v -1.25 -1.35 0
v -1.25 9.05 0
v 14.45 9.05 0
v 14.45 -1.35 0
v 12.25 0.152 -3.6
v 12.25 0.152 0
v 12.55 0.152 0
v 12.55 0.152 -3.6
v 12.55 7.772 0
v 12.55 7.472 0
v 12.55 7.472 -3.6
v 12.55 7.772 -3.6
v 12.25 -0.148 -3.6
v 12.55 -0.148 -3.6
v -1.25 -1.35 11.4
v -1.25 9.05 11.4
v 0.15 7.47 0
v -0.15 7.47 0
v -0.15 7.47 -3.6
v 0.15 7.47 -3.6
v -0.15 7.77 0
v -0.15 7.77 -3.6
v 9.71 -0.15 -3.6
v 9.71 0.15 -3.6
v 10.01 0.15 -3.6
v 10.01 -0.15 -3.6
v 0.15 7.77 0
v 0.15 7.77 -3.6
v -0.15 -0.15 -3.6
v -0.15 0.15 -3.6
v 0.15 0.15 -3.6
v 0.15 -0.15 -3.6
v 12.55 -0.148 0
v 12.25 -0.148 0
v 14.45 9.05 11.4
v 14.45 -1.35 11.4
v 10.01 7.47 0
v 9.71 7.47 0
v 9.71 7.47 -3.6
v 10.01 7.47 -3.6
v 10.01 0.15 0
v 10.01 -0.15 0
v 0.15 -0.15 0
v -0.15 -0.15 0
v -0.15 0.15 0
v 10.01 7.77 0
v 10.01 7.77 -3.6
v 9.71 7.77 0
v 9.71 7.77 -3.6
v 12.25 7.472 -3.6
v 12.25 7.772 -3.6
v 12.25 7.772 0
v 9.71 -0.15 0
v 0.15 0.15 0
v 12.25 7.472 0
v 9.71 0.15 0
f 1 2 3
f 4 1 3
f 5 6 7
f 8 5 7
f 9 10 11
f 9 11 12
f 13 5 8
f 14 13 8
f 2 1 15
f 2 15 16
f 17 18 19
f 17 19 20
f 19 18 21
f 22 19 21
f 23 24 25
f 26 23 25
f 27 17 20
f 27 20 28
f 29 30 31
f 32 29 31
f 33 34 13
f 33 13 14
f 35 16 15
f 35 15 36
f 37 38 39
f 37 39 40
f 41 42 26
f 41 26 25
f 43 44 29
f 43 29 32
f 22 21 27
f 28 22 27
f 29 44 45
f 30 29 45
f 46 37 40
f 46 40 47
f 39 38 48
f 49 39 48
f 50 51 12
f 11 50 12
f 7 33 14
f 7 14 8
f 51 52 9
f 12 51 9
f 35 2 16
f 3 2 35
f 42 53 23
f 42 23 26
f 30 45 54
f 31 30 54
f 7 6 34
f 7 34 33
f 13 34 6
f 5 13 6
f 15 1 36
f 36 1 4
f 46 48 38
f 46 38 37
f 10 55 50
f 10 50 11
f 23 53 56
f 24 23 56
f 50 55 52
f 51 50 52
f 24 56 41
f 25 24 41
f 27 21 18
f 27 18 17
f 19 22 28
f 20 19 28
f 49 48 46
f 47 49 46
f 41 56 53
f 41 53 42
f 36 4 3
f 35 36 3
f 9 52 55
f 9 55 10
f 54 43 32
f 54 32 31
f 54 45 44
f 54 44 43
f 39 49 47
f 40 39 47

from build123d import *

# Parameters (mm, degrees)
SKETCH_W     = 15.7
SKETCH_H     = 10.4
PAD_DEPTH    = 11.4
SKETCH001_W  = 0.3
SKETCH001_H  = 0.3
PAD001_DEPTH = 3.6


with BuildPart() as pad:
    # Sketch → Pad (new body)
    with BuildSketch(Plane.XY):
        with Locations((6.6, 3.85)):
            Rectangle(SKETCH_W, SKETCH_H)
    extrude(amount=PAD_DEPTH)


with BuildPart() as pad001:
    # Sketch001 → Pad001 (new body)
    with BuildSketch(Plane.XY):
        Rectangle(SKETCH001_W, SKETCH001_H)
        with Locations((9.86, 0)):
            Rectangle(SKETCH001_W, SKETCH001_H)
        with Locations((0, 7.62)):
            Rectangle(SKETCH001_W, SKETCH001_H)
        with Locations((9.86, 7.62)):
            Rectangle(SKETCH001_W, SKETCH001_H)
        with Locations((12.4, 0.001869)):
            Rectangle(SKETCH001_W, SKETCH001_H)
        with Locations((12.4, 7.621869)):
            Rectangle(SKETCH001_W, SKETCH001_H)
    extrude(amount=-PAD001_DEPTH)


solid = Compound([pad.part, pad001.part])
